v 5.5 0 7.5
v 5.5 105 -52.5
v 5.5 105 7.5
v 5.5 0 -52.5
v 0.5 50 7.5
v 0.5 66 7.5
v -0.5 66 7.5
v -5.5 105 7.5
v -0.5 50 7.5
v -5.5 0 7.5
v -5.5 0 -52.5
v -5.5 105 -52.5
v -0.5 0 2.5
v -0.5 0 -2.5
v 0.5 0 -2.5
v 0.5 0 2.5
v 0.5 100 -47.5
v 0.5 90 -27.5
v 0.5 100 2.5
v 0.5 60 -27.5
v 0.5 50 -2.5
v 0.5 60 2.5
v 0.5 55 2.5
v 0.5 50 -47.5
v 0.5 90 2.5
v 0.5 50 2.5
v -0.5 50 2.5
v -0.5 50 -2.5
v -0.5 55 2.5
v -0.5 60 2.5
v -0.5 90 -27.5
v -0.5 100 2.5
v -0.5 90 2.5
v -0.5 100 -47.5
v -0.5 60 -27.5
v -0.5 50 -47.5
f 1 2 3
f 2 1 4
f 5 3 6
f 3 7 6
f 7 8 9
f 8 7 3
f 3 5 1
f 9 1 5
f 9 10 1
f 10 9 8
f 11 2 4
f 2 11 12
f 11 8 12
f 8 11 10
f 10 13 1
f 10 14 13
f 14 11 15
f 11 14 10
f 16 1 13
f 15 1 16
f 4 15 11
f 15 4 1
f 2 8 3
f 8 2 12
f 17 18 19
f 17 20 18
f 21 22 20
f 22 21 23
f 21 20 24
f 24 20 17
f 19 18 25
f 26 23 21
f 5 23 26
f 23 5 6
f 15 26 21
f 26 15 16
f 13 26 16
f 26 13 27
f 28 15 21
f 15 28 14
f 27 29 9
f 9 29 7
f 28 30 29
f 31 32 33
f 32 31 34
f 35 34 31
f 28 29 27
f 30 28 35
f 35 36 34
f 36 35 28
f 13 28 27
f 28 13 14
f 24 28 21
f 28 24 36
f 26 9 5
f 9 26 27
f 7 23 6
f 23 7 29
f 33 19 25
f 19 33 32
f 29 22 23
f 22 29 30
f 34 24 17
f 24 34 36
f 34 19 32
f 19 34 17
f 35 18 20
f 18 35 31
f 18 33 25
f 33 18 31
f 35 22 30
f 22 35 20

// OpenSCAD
// Baseline CAD geometry, with all dimensions in millimetres; +Y follows the throat and +Z is up.
// Positive modules describe air/cutting volumes; skin modules describe outer material.
// solidBody subtracts the former from the latter. The thin spawn cube spans Y=-1 to 0,
// so the generator can retain its Y=0 face and construct the inlet boundary rectangle.
// The final two calls display BOTH objects. Export each module separately as ASCII STL
// using the wrapper procedure in README; exporting this complete scene combines them.

skinThickness = 5;

throatWidth = 1;
throatLength = 50;
throatHeight = 5;

voicingHoleWidth = 1;
voicingHoleLength = 5;
voicingHoleHeight = skinThickness;
voicingHoleX = -voicingHoleWidth / 2;
voicingHoleY = throatLength;
voicingHoleZ = throatHeight / 2;

voicingEdgeLength = 10;

pressureChamberWidth = 1;
pressureChamberLength = 50;
pressureChamberHeight = 50;
pressureChamberX = -pressureChamberWidth / 2;
pressureChamberY = throatLength;
pressureChamberZ = -pressureChamberHeight + throatHeight / 2;

chamberFillerLength = 30;
chamberFillerHeight = 30;


module throatPositive() {
    translate([-throatWidth / 2, -1, -throatHeight / 2])
    cube([throatWidth, throatLength + 2, throatHeight]);
}

module throatSkin() {
    translate([-(pressureChamberWidth + skinThickness * 2) / 2, 0, pressureChamberZ - skinThickness])
    cube([pressureChamberWidth + skinThickness * 2, throatLength - 1, pressureChamberHeight + skinThickness * 2]);
}

module voicingHolePositive() {
    translate([voicingHoleX, voicingHoleY, voicingHoleZ - 1])
    cube([voicingHoleWidth, voicingHoleLength, voicingHoleHeight + 2]);
}

module voicingEdgePositive() {
    translate([voicingHoleWidth / 2, voicingHoleY + voicingHoleLength - 0.00001, throatHeight / 2])
    rotate([0, -90, 0])
    linear_extrude(height = voicingHoleWidth)
    polygon([
        [0, 0],
        [skinThickness + 0.00001, 0],
        [skinThickness + 0.00001, voicingEdgeLength + 1]
    ]);
}

module pressureChamberPositive() {
    translate([pressureChamberX, pressureChamberY, pressureChamberZ])
    cube([pressureChamberWidth, pressureChamberLength, pressureChamberHeight]);
}

module pressureChamberSkin() {
    translate([pressureChamberX - skinThickness, pressureChamberY - skinThickness, pressureChamberZ - skinThickness])
    cube([pressureChamberWidth + skinThickness * 2, pressureChamberLength + skinThickness * 2, pressureChamberHeight + skinThickness * 2]);
}

module positiveGroup() {
    union() {
        throatPositive();
        voicingHolePositive();
        voicingEdgePositive();
        pressureChamberPositive();
    }
}

module skinGroup() {
    union() {
        throatSkin();
        pressureChamberSkin();
    }
}

module solidBody() {
    difference() {
        skinGroup();
        positiveGroup();
    }
    
    translate([pressureChamberX - skinThickness, pressureChamberY + pressureChamberLength / 2 - chamberFillerLength / 2, pressureChamberZ + pressureChamberHeight - chamberFillerHeight])
    cube([pressureChamberWidth + skinThickness * 2, chamberFillerLength, chamberFillerHeight]);
    
}

module spawnPlane() {
    translate([-throatWidth / 2, -1, -throatHeight / 2])
    cube([throatWidth, 1, throatHeight]);
}

difference() {
solidBody();
//translate([0, -500, -500]) cube([1000, 1000, 1000]);
}
*spawnPlane();
